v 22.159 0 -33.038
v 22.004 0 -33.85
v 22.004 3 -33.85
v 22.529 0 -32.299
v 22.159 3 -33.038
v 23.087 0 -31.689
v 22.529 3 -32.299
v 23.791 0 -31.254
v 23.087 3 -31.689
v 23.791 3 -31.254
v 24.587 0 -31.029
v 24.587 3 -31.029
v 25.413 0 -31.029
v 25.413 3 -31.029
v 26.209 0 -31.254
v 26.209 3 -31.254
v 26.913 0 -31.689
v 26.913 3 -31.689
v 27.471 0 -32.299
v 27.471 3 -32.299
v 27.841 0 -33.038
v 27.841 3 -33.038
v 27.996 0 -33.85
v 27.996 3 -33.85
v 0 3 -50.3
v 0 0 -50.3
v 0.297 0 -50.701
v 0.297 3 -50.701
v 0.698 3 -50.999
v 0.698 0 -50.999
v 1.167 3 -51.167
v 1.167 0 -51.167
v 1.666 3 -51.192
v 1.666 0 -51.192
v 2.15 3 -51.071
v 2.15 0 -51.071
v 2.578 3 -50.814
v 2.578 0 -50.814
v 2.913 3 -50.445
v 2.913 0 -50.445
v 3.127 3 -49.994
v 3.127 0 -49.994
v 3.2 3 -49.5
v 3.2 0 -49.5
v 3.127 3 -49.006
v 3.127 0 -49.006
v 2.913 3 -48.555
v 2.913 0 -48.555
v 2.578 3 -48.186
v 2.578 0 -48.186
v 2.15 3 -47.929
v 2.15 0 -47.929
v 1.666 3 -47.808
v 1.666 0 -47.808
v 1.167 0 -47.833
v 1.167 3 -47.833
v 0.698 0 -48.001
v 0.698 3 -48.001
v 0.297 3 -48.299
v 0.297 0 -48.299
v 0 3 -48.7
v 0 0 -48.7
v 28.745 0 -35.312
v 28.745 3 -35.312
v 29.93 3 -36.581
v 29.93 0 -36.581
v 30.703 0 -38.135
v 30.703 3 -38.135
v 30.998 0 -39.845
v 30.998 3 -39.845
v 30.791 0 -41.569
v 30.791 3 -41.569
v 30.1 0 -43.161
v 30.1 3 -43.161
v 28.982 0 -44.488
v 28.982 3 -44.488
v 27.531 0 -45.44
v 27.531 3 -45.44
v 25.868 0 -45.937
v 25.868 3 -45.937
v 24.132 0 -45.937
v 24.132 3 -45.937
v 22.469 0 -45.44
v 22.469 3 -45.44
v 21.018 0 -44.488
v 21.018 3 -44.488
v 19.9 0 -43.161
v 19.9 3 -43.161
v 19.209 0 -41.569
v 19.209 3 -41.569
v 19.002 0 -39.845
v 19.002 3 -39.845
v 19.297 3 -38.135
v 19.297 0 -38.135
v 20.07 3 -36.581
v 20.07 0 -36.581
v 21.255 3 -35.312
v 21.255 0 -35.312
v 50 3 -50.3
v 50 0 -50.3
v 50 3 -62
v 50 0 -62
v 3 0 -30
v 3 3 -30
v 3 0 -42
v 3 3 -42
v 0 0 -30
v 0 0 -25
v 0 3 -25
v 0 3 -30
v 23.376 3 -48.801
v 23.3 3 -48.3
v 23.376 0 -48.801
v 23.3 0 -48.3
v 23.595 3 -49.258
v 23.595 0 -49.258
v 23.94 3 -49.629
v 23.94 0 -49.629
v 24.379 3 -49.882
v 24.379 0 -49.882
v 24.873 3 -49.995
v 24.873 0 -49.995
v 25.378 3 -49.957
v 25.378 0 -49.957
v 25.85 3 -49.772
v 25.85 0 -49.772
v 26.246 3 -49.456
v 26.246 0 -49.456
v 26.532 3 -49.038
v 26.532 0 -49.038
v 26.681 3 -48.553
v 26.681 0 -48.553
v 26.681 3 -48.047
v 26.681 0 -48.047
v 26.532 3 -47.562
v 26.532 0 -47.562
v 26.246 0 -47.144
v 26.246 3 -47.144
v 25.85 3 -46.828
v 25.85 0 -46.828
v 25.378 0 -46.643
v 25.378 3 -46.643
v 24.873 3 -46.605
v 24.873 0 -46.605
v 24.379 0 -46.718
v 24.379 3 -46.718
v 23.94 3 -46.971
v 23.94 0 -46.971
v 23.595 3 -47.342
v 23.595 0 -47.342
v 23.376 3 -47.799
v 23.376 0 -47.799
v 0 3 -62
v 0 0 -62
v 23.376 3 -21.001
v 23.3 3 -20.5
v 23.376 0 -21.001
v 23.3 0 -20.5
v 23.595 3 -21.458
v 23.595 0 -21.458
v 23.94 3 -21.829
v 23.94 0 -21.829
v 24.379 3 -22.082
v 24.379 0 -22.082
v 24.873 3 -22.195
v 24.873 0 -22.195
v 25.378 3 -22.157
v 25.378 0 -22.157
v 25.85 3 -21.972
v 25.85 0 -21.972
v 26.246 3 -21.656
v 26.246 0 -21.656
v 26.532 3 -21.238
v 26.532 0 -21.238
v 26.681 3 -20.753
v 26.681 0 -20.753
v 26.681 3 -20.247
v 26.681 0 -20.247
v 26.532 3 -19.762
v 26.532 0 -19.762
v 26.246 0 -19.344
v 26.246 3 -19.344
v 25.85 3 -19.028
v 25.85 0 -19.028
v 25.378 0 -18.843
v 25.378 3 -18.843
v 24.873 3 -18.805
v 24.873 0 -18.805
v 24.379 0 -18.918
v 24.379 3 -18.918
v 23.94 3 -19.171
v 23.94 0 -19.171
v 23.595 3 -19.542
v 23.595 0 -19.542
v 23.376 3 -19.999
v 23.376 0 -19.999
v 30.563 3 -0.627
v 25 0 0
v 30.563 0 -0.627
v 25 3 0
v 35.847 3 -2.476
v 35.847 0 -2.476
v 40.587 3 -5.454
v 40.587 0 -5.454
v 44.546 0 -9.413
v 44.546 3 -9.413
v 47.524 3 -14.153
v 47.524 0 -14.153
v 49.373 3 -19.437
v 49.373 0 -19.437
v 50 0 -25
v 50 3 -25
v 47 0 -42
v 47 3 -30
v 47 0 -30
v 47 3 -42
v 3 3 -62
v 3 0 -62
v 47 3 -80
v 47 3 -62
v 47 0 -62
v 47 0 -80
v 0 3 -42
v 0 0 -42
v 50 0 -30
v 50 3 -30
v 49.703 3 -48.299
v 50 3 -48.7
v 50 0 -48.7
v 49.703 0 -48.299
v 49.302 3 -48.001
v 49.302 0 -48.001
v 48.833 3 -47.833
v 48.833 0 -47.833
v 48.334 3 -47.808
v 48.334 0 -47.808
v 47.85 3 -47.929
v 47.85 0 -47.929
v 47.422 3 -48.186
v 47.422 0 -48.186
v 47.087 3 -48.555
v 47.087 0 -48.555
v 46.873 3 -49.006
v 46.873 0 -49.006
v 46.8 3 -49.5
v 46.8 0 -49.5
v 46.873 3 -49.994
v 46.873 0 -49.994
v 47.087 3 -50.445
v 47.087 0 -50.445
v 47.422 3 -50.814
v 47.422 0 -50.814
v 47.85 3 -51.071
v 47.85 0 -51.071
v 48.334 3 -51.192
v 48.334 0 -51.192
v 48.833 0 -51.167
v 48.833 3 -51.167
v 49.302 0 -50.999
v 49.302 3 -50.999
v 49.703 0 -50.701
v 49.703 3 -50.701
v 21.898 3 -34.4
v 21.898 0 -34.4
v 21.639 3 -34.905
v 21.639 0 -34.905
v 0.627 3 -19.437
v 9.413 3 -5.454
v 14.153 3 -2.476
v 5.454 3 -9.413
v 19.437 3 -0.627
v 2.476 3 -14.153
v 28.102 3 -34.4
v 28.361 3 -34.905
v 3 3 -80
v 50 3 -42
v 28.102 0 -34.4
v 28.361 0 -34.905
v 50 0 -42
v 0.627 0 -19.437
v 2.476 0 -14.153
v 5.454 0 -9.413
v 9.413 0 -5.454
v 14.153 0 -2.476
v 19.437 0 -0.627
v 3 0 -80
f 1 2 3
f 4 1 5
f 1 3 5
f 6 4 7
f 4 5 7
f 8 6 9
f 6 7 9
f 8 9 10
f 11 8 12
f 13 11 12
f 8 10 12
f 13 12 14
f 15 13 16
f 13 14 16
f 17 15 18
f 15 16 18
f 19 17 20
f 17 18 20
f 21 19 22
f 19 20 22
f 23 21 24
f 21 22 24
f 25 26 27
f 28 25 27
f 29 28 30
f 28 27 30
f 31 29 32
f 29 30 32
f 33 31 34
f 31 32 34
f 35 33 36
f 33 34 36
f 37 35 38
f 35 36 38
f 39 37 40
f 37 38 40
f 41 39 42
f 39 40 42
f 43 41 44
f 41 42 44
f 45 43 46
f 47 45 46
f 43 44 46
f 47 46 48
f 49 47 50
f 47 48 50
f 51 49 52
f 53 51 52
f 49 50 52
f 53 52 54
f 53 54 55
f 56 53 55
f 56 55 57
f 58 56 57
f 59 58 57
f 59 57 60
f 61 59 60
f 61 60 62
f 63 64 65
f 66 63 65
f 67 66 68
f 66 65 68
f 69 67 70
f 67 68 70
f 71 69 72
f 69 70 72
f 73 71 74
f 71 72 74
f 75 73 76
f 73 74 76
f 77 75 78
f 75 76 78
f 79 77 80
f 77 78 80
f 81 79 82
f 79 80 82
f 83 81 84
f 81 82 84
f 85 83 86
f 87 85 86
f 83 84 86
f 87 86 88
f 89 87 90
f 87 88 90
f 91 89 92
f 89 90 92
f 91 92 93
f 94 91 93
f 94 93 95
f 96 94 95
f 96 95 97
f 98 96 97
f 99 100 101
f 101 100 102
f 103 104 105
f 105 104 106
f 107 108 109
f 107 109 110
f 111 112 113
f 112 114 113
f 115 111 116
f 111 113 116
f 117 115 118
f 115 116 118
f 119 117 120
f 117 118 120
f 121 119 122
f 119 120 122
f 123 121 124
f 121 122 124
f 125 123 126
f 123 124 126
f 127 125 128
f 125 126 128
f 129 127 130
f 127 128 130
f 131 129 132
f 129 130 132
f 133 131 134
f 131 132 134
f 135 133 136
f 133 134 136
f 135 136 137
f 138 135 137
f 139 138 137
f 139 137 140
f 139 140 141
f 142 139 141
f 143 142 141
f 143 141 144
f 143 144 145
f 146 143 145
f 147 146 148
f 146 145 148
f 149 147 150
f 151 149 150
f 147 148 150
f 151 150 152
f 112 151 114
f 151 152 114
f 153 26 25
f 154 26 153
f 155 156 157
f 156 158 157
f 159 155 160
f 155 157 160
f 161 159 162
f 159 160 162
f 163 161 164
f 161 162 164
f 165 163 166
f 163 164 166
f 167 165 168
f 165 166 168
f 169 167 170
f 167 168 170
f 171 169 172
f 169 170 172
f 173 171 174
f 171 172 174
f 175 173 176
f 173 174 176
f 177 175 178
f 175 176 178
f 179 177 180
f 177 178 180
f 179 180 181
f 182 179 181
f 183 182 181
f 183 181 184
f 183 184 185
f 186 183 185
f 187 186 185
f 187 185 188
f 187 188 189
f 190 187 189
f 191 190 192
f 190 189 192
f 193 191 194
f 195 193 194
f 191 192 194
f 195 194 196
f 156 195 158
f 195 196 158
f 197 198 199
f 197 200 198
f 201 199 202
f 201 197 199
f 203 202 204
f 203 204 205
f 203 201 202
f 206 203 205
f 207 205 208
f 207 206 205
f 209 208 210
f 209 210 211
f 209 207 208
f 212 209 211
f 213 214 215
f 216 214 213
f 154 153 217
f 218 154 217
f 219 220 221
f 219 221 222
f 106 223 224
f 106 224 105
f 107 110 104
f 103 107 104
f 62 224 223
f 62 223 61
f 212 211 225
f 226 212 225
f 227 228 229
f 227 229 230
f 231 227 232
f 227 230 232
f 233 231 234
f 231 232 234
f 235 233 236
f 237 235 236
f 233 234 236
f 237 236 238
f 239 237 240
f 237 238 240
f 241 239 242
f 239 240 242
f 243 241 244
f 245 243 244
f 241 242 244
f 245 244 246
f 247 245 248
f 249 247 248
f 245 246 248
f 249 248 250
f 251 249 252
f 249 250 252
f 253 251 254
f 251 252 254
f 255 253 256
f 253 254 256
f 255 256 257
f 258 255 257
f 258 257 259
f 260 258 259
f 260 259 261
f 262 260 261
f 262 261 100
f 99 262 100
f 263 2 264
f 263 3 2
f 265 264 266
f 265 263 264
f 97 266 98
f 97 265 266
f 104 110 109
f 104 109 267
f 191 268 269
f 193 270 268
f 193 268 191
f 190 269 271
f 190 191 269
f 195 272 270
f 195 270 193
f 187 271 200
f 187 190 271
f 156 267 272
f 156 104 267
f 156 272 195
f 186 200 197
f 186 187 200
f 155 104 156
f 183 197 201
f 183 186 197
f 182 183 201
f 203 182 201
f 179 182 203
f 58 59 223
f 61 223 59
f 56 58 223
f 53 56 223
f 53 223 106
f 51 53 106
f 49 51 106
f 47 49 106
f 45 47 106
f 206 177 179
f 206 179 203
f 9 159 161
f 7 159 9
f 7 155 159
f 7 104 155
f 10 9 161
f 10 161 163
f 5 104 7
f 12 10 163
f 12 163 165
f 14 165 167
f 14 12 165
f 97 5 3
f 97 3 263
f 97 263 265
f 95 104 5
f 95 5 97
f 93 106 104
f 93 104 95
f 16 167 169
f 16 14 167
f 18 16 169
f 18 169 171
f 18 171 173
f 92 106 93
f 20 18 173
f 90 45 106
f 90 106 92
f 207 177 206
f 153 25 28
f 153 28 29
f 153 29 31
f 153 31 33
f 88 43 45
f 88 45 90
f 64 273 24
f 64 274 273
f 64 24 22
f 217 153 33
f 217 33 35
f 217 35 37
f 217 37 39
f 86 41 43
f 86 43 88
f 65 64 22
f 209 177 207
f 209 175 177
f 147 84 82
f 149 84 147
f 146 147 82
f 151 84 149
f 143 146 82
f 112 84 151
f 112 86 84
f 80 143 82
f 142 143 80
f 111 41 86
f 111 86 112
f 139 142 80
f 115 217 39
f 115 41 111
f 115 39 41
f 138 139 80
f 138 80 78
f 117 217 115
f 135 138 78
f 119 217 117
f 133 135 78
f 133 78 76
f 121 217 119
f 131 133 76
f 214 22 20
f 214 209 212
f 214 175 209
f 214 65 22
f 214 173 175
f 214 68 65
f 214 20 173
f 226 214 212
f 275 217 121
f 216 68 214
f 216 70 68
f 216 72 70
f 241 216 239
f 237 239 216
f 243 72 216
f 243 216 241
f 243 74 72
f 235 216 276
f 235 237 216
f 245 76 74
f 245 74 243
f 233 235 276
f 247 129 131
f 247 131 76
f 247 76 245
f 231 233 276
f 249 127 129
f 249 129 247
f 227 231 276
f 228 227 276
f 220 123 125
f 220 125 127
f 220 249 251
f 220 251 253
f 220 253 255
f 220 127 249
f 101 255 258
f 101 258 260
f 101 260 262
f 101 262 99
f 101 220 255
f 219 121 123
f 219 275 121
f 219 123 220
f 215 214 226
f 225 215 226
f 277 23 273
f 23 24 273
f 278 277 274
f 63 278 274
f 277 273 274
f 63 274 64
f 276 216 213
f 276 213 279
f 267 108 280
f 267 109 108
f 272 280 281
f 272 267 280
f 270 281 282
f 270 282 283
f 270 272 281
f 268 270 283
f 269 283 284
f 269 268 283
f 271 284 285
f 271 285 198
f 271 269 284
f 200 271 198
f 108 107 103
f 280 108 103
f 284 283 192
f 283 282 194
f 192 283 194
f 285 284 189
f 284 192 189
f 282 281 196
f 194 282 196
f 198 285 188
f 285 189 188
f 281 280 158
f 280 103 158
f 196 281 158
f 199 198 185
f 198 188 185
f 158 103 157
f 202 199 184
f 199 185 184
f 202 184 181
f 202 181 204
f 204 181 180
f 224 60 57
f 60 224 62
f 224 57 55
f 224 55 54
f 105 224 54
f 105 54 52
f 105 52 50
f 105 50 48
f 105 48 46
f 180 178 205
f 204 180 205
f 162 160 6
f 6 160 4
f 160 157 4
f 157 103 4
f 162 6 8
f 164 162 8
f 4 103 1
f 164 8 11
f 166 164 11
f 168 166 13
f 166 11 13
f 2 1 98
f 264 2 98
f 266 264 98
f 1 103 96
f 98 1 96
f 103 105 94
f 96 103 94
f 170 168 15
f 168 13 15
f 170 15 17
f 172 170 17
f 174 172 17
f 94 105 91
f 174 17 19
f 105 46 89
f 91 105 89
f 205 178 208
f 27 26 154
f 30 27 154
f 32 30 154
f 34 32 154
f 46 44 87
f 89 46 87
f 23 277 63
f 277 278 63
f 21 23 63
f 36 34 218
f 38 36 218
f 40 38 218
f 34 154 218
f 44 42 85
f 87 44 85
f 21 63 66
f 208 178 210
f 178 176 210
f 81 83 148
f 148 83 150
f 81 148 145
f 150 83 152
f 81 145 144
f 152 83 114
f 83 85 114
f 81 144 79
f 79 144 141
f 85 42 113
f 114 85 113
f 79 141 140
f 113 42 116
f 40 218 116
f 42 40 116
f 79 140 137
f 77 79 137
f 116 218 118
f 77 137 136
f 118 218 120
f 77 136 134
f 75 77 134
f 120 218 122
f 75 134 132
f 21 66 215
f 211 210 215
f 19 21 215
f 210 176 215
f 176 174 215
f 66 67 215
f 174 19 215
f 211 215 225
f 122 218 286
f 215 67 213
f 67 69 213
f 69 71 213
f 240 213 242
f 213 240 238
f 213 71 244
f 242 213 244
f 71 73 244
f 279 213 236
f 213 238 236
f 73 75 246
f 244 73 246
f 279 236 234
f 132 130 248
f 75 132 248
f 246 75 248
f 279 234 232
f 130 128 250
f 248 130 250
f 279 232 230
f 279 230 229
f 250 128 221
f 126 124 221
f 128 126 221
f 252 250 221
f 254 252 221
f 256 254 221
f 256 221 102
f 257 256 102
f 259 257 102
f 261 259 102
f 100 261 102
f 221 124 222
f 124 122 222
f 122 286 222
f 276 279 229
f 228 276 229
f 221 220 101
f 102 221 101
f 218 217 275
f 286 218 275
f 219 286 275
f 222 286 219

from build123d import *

# Parameters (mm, degrees)
SKETCH2_W                = 50
SKETCH2_H                = 80
BOSS_EXTRUDE1_DEPTH      = 3
M4_CLEARANCE_HOLE1_D     = 4.5
M4_CLEARANCE_HOLE1_DEPTH = 3
M4_CLEARANCE_HOLE1_TIP   = 1.351936393
SKETCH5_R                = 6
CUT_EXTRUDE1_DEPTH       = 3
SKETCH6_R                = 3
CUT_EXTRUDE2_DEPTH       = 3
FILLET1_R                = 2
FILLET2_R                = 25
SKETCH7_W                = 3
SKETCH7_H                = 18
SKETCH7_H_2              = 12
CUT_EXTRUDE3_DEPTH       = 3
M3_CLEARANCE_HOLE1_D     = 3.4
M3_CLEARANCE_HOLE1_DEPTH = 3
M3_CLEARANCE_HOLE1_TIP   = 1.021463052
M3_CLEARANCE_HOLE2_D     = 3.4


with BuildPart() as part:
    # Sketch2 → Boss-Extrude1 (new body)
    with BuildSketch(Plane(origin=(0, 0, 0), x_dir=(1, 0, 0), z_dir=(0, 1, 0))):
        with Locations((25, 40)):
            Rectangle(SKETCH2_W, SKETCH2_H)
    extrude(amount=BOSS_EXTRUDE1_DEPTH)

    # M4 Clearance Hole1
    with Locations(Plane(origin=(0, 3, 0), x_dir=(1, 0, 0), z_dir=(0, 1, 0))):
        with Locations((25, 40)):
            Hole(M4_CLEARANCE_HOLE1_D / 2, depth=M4_CLEARANCE_HOLE1_DEPTH)
            with Locations((0, 0, -(M4_CLEARANCE_HOLE1_DEPTH + M4_CLEARANCE_HOLE1_TIP / 2))):  # 118° drill point
                Cone(0, M4_CLEARANCE_HOLE1_D / 2, M4_CLEARANCE_HOLE1_TIP, mode=Mode.SUBTRACT)

    # Sketch5 → Cut-Extrude1 (cut)
    with BuildSketch(Plane(origin=(0, 3, 0), x_dir=(1, 0, 0), z_dir=(0, 1, 0))):
        with Locations(Location((25, 40, 0), (0, 0, 270))):
            Circle(SKETCH5_R)
    extrude(amount=-CUT_EXTRUDE1_DEPTH, mode=Mode.SUBTRACT)

    # Sketch6 → Cut-Extrude2 (cut)
    with BuildSketch(Plane(origin=(0, 3, 0), x_dir=(1, 0, 0), z_dir=(0, 1, 0))):
        with Locations((25, 34)):
            Circle(SKETCH6_R)
    extrude(amount=-CUT_EXTRUDE2_DEPTH, mode=Mode.SUBTRACT)

    # Fillet1
    fillet1_edges = [part.edges().sort_by_distance(p)[0] for p in [
        (22.09526249, 1.5, -34.75),
        (27.90473751, 1.5, -34.75),
    ]]
    fillet(fillet1_edges, radius=FILLET1_R)

    # Fillet2
    fillet2_edges = [part.edges().sort_by_distance(p)[0] for p in [
        (0, 1.5, 0),
        (50, 1.5, 0),
    ]]
    fillet(fillet2_edges, radius=FILLET2_R - 0.0001)  # a hair under: the kernel refuses the full size

    # Sketch7 → Cut-Extrude3 (cut)
    with BuildSketch(Plane(origin=(0, 3, 0), x_dir=(1, 0, 0), z_dir=(0, 1, 0))):
        with Locations((48.5, 71)):
            Rectangle(SKETCH7_W, SKETCH7_H)
        with Locations((1.5, 71)):
            Rectangle(SKETCH7_W, SKETCH7_H)
        with Locations((48.5, 36)):
            Rectangle(SKETCH7_W, SKETCH7_H_2)
        with Locations((1.5, 36)):
            Rectangle(SKETCH7_W, SKETCH7_H_2)
    extrude(amount=-CUT_EXTRUDE3_DEPTH, mode=Mode.SUBTRACT)

    # M3 Clearance Hole1
    with Locations(Plane(origin=(0, 3, 0), x_dir=(1, 0, 0), z_dir=(0, 1, 0))):
        with Locations((25, 48.3), (25, 20.5)):
            Hole(M3_CLEARANCE_HOLE1_D / 2, depth=M3_CLEARANCE_HOLE1_DEPTH)
            with Locations((0, 0, -(M3_CLEARANCE_HOLE1_DEPTH + M3_CLEARANCE_HOLE1_TIP / 2))):  # 118° drill point
                Cone(0, M3_CLEARANCE_HOLE1_D / 2, M3_CLEARANCE_HOLE1_TIP, mode=Mode.SUBTRACT)

    # M3 Clearance Hole2 (through all)
    with Locations(Plane(origin=(0, 3, 0), x_dir=(1, 0, 0), z_dir=(0, 1, 0))):
        with Locations((1.5, 49.5), (48.5, 49.5)):
            Hole(M3_CLEARANCE_HOLE2_D / 2)


solid = part.part
